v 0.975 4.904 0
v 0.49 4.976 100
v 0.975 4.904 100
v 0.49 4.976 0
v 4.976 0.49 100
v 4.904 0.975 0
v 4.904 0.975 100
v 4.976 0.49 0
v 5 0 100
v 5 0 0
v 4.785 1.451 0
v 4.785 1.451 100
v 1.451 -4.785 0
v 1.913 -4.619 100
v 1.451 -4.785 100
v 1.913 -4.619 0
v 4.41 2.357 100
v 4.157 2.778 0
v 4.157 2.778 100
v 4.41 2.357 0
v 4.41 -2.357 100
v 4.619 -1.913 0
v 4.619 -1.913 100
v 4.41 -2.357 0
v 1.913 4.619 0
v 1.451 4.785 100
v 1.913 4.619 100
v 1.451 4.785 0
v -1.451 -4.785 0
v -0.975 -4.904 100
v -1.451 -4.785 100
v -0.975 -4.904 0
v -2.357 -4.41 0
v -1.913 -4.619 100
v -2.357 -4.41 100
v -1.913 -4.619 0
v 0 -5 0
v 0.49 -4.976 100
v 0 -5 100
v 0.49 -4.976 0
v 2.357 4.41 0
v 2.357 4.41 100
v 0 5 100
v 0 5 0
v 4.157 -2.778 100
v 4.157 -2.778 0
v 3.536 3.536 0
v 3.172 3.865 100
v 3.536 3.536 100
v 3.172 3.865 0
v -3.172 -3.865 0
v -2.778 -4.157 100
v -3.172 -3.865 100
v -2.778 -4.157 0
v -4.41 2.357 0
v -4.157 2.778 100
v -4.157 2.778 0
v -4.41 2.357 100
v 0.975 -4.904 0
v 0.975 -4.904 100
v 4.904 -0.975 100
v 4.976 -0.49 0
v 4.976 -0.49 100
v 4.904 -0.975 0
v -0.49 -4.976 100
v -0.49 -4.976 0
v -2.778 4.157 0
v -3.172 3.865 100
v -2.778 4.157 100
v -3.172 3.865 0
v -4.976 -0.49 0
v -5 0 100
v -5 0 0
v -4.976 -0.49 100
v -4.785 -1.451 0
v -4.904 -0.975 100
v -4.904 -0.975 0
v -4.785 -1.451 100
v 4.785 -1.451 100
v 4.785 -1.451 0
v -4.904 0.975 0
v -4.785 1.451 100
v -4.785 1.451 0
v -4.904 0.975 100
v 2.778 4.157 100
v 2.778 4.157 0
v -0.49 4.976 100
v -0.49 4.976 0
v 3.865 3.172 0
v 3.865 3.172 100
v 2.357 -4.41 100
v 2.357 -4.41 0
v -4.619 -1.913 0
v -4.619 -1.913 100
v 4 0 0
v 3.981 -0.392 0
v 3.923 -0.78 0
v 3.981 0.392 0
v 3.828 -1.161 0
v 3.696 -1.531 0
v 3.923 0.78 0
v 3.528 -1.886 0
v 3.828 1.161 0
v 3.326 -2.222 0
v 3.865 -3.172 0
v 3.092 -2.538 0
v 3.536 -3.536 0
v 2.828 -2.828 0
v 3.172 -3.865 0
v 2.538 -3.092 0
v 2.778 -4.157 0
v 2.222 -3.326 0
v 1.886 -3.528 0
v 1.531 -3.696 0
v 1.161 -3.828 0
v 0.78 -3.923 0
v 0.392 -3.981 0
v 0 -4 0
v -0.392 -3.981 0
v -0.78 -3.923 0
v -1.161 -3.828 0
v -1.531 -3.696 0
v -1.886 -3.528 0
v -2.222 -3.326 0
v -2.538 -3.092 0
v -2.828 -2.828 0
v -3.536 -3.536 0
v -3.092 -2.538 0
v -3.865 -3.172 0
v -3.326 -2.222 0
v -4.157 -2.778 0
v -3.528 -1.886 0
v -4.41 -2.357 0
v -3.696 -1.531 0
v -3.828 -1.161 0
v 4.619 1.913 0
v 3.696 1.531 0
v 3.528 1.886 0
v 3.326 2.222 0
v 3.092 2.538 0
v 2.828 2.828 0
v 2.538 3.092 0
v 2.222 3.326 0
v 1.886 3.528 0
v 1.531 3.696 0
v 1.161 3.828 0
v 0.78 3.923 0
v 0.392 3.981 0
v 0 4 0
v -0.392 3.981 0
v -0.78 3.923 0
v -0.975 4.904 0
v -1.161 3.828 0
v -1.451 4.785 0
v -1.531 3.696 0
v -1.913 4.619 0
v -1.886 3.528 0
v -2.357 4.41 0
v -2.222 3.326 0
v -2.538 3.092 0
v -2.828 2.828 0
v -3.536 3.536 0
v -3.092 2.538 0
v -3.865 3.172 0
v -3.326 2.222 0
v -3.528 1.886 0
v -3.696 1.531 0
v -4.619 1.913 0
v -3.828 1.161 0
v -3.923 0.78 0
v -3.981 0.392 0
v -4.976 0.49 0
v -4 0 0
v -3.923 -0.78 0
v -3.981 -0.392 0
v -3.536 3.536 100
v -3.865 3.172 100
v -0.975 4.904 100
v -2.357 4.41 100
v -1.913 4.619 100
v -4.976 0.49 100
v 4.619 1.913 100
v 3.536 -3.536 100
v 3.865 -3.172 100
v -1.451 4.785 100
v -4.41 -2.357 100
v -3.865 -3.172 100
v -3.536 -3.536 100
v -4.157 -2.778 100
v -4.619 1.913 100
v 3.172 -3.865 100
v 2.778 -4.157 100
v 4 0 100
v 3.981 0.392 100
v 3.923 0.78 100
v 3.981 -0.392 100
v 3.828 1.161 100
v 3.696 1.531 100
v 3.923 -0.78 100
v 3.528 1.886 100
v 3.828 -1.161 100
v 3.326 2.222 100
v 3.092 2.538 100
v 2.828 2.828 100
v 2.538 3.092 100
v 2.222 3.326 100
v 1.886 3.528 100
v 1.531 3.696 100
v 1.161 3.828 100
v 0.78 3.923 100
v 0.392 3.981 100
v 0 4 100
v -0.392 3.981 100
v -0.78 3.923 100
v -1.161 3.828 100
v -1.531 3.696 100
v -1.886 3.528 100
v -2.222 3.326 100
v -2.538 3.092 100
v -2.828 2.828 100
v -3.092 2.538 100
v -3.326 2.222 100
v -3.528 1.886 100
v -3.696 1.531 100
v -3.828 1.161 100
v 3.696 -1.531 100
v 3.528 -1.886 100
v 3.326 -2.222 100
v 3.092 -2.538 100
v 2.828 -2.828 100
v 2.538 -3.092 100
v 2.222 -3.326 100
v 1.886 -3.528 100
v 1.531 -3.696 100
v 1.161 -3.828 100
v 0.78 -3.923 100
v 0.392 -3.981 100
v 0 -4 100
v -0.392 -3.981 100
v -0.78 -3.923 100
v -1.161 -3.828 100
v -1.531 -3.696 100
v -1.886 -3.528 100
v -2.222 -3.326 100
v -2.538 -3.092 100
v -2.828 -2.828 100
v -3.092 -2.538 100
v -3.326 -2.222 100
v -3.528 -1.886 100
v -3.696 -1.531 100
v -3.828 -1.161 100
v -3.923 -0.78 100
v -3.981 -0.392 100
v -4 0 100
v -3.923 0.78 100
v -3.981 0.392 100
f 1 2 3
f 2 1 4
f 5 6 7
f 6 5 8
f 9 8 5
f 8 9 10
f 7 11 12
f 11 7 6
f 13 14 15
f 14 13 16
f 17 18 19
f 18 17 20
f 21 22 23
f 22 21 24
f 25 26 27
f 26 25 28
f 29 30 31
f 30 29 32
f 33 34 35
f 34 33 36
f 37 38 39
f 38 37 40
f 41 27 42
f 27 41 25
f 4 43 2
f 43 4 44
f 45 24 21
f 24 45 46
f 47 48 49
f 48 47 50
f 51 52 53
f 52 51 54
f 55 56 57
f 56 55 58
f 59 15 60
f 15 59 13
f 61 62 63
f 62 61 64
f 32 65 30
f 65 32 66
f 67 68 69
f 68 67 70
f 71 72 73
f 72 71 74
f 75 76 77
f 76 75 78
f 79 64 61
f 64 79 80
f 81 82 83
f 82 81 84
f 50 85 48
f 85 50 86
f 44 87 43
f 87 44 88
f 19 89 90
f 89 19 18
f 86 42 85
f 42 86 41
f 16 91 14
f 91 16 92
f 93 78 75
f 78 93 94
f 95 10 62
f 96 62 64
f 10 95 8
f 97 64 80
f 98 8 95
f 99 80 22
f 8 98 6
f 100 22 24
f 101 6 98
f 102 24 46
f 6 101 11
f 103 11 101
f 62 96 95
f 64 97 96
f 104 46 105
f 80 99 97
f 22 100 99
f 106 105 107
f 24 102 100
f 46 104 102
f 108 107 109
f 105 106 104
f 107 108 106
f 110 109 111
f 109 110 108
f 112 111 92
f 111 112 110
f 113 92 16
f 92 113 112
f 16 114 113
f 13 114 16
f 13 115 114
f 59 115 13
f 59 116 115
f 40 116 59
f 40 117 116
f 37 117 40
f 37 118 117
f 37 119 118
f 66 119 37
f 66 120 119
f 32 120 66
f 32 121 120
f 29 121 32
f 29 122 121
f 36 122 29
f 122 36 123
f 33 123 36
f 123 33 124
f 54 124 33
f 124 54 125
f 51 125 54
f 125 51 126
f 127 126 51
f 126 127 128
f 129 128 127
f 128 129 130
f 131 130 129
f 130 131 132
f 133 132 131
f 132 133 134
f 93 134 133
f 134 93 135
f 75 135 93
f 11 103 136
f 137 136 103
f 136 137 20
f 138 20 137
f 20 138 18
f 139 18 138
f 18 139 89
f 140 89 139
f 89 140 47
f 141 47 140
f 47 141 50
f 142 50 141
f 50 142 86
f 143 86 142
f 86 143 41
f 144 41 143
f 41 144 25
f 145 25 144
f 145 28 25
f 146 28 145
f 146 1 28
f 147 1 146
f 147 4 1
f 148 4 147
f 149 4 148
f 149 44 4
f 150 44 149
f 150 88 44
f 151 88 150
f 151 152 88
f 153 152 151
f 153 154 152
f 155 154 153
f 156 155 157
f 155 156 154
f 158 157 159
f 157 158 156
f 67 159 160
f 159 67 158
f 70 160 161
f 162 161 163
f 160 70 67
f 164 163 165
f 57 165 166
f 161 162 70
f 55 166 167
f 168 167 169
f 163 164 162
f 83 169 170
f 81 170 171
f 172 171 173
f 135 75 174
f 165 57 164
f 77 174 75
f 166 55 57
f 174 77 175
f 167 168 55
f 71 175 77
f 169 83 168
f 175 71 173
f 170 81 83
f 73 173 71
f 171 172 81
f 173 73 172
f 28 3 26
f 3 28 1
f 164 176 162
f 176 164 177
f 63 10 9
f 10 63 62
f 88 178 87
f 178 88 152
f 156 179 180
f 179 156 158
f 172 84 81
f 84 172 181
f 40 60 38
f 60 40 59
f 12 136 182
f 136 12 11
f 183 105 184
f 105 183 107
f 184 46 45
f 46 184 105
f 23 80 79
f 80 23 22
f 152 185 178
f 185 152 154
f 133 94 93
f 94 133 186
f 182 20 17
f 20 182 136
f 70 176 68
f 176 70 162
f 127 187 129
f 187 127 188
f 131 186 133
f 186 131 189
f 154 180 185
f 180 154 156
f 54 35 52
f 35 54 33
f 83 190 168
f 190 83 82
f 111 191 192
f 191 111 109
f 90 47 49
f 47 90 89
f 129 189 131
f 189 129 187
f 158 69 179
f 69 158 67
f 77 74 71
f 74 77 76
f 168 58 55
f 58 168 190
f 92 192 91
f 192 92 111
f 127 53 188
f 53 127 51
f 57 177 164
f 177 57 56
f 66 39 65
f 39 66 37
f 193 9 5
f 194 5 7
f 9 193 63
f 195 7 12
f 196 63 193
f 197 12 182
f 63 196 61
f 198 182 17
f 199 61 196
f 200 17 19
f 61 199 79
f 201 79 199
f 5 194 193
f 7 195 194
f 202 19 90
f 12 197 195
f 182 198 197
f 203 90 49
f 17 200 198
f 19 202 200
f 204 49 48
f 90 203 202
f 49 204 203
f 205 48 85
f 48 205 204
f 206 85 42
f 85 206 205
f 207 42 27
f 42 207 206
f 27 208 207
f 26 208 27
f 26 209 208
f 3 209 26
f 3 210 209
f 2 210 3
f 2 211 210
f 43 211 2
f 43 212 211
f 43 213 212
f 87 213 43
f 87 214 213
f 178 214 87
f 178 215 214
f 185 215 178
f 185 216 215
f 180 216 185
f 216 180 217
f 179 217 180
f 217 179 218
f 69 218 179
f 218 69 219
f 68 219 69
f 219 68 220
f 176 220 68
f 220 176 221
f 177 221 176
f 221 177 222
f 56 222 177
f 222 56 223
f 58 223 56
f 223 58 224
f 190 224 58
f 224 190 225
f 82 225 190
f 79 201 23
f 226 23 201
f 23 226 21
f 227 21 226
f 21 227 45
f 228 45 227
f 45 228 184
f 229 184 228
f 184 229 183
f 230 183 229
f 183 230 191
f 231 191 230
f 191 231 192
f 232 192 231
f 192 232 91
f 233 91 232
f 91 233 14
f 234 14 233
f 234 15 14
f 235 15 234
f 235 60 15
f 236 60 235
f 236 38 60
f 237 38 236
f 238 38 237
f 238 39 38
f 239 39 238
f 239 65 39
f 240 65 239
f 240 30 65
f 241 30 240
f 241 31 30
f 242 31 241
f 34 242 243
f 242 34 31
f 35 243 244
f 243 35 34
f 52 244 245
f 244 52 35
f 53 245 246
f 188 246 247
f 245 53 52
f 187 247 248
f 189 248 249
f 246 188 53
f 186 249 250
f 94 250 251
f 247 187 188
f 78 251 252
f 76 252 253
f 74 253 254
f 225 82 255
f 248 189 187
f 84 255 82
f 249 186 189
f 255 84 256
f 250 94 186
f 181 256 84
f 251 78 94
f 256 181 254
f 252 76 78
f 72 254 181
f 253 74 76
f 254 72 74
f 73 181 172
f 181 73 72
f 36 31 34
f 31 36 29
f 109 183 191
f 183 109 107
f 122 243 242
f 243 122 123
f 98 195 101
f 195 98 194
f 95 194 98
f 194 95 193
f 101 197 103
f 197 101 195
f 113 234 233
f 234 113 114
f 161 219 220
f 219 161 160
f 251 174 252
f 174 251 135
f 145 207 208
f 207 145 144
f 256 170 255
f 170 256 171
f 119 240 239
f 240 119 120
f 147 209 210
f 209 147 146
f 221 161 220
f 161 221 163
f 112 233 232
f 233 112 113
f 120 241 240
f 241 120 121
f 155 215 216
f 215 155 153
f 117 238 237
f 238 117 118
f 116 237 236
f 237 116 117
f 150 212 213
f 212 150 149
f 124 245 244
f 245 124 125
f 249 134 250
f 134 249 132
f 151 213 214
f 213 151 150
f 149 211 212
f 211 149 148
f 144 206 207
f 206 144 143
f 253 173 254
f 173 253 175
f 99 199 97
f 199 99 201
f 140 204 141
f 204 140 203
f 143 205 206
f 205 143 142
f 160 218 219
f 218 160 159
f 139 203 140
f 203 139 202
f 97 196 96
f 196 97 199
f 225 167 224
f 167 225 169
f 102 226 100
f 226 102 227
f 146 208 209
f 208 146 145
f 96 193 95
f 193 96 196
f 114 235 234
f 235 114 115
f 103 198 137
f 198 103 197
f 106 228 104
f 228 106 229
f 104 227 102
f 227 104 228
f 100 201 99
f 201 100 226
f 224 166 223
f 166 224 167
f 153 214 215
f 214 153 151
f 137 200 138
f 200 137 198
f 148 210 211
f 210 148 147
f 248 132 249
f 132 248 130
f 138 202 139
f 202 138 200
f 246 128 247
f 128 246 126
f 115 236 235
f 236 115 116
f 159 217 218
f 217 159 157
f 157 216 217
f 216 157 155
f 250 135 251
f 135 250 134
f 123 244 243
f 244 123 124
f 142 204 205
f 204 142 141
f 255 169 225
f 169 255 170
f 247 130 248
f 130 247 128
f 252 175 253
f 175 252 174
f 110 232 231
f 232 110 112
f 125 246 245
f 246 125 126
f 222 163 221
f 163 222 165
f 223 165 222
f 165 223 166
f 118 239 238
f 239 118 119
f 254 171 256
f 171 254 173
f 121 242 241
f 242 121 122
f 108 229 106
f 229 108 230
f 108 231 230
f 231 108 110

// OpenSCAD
module ptfe_sleeving(outer_diameter=10, inner_diameter=8, length=100) {
    difference() {
        cylinder(h=length, d=outer_diameter, $fn=64);
        translate([0, 0, -1])
            cylinder(h=length + 2, d=inner_diameter, $fn=64);
    }
}

ptfe_sleeving();
